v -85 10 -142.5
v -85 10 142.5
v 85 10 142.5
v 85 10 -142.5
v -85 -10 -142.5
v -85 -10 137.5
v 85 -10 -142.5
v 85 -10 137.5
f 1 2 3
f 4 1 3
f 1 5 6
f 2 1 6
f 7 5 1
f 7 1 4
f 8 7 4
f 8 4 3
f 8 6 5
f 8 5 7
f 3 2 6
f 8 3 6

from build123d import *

# Parameters (mm, degrees)
F0_W     = 170
F0_H     = 285
F1_DEPTH = 10
F3_DEPTH = 170.001
F5_ANGLE = 90


with BuildPart() as f1:
    # F0 (on Top) → F1 (new body, symmetric)
    with BuildSketch(Plane.XY):
        Rectangle(F0_W, F0_H)
    extrude(amount=F1_DEPTH, both=True)

    # F2 (on face) → F3 (cut, through all)
    with BuildSketch(Plane(origin=(-85, 0, 0), x_dir=(0, -1, 0), z_dir=(-1, 0, 0))):
        Polygon((-142.5, -10), (-137.5, 10), (-142.5, 10), align=None)
    extrude(amount=-F3_DEPTH, mode=Mode.SUBTRACT)


with BuildPart() as f1_1:
    # F5: moved
    add(f1.part.rotate(Axis((66.870868, 0, 0), (1, 0, 0)), F5_ANGLE))


solid = f1_1.part
